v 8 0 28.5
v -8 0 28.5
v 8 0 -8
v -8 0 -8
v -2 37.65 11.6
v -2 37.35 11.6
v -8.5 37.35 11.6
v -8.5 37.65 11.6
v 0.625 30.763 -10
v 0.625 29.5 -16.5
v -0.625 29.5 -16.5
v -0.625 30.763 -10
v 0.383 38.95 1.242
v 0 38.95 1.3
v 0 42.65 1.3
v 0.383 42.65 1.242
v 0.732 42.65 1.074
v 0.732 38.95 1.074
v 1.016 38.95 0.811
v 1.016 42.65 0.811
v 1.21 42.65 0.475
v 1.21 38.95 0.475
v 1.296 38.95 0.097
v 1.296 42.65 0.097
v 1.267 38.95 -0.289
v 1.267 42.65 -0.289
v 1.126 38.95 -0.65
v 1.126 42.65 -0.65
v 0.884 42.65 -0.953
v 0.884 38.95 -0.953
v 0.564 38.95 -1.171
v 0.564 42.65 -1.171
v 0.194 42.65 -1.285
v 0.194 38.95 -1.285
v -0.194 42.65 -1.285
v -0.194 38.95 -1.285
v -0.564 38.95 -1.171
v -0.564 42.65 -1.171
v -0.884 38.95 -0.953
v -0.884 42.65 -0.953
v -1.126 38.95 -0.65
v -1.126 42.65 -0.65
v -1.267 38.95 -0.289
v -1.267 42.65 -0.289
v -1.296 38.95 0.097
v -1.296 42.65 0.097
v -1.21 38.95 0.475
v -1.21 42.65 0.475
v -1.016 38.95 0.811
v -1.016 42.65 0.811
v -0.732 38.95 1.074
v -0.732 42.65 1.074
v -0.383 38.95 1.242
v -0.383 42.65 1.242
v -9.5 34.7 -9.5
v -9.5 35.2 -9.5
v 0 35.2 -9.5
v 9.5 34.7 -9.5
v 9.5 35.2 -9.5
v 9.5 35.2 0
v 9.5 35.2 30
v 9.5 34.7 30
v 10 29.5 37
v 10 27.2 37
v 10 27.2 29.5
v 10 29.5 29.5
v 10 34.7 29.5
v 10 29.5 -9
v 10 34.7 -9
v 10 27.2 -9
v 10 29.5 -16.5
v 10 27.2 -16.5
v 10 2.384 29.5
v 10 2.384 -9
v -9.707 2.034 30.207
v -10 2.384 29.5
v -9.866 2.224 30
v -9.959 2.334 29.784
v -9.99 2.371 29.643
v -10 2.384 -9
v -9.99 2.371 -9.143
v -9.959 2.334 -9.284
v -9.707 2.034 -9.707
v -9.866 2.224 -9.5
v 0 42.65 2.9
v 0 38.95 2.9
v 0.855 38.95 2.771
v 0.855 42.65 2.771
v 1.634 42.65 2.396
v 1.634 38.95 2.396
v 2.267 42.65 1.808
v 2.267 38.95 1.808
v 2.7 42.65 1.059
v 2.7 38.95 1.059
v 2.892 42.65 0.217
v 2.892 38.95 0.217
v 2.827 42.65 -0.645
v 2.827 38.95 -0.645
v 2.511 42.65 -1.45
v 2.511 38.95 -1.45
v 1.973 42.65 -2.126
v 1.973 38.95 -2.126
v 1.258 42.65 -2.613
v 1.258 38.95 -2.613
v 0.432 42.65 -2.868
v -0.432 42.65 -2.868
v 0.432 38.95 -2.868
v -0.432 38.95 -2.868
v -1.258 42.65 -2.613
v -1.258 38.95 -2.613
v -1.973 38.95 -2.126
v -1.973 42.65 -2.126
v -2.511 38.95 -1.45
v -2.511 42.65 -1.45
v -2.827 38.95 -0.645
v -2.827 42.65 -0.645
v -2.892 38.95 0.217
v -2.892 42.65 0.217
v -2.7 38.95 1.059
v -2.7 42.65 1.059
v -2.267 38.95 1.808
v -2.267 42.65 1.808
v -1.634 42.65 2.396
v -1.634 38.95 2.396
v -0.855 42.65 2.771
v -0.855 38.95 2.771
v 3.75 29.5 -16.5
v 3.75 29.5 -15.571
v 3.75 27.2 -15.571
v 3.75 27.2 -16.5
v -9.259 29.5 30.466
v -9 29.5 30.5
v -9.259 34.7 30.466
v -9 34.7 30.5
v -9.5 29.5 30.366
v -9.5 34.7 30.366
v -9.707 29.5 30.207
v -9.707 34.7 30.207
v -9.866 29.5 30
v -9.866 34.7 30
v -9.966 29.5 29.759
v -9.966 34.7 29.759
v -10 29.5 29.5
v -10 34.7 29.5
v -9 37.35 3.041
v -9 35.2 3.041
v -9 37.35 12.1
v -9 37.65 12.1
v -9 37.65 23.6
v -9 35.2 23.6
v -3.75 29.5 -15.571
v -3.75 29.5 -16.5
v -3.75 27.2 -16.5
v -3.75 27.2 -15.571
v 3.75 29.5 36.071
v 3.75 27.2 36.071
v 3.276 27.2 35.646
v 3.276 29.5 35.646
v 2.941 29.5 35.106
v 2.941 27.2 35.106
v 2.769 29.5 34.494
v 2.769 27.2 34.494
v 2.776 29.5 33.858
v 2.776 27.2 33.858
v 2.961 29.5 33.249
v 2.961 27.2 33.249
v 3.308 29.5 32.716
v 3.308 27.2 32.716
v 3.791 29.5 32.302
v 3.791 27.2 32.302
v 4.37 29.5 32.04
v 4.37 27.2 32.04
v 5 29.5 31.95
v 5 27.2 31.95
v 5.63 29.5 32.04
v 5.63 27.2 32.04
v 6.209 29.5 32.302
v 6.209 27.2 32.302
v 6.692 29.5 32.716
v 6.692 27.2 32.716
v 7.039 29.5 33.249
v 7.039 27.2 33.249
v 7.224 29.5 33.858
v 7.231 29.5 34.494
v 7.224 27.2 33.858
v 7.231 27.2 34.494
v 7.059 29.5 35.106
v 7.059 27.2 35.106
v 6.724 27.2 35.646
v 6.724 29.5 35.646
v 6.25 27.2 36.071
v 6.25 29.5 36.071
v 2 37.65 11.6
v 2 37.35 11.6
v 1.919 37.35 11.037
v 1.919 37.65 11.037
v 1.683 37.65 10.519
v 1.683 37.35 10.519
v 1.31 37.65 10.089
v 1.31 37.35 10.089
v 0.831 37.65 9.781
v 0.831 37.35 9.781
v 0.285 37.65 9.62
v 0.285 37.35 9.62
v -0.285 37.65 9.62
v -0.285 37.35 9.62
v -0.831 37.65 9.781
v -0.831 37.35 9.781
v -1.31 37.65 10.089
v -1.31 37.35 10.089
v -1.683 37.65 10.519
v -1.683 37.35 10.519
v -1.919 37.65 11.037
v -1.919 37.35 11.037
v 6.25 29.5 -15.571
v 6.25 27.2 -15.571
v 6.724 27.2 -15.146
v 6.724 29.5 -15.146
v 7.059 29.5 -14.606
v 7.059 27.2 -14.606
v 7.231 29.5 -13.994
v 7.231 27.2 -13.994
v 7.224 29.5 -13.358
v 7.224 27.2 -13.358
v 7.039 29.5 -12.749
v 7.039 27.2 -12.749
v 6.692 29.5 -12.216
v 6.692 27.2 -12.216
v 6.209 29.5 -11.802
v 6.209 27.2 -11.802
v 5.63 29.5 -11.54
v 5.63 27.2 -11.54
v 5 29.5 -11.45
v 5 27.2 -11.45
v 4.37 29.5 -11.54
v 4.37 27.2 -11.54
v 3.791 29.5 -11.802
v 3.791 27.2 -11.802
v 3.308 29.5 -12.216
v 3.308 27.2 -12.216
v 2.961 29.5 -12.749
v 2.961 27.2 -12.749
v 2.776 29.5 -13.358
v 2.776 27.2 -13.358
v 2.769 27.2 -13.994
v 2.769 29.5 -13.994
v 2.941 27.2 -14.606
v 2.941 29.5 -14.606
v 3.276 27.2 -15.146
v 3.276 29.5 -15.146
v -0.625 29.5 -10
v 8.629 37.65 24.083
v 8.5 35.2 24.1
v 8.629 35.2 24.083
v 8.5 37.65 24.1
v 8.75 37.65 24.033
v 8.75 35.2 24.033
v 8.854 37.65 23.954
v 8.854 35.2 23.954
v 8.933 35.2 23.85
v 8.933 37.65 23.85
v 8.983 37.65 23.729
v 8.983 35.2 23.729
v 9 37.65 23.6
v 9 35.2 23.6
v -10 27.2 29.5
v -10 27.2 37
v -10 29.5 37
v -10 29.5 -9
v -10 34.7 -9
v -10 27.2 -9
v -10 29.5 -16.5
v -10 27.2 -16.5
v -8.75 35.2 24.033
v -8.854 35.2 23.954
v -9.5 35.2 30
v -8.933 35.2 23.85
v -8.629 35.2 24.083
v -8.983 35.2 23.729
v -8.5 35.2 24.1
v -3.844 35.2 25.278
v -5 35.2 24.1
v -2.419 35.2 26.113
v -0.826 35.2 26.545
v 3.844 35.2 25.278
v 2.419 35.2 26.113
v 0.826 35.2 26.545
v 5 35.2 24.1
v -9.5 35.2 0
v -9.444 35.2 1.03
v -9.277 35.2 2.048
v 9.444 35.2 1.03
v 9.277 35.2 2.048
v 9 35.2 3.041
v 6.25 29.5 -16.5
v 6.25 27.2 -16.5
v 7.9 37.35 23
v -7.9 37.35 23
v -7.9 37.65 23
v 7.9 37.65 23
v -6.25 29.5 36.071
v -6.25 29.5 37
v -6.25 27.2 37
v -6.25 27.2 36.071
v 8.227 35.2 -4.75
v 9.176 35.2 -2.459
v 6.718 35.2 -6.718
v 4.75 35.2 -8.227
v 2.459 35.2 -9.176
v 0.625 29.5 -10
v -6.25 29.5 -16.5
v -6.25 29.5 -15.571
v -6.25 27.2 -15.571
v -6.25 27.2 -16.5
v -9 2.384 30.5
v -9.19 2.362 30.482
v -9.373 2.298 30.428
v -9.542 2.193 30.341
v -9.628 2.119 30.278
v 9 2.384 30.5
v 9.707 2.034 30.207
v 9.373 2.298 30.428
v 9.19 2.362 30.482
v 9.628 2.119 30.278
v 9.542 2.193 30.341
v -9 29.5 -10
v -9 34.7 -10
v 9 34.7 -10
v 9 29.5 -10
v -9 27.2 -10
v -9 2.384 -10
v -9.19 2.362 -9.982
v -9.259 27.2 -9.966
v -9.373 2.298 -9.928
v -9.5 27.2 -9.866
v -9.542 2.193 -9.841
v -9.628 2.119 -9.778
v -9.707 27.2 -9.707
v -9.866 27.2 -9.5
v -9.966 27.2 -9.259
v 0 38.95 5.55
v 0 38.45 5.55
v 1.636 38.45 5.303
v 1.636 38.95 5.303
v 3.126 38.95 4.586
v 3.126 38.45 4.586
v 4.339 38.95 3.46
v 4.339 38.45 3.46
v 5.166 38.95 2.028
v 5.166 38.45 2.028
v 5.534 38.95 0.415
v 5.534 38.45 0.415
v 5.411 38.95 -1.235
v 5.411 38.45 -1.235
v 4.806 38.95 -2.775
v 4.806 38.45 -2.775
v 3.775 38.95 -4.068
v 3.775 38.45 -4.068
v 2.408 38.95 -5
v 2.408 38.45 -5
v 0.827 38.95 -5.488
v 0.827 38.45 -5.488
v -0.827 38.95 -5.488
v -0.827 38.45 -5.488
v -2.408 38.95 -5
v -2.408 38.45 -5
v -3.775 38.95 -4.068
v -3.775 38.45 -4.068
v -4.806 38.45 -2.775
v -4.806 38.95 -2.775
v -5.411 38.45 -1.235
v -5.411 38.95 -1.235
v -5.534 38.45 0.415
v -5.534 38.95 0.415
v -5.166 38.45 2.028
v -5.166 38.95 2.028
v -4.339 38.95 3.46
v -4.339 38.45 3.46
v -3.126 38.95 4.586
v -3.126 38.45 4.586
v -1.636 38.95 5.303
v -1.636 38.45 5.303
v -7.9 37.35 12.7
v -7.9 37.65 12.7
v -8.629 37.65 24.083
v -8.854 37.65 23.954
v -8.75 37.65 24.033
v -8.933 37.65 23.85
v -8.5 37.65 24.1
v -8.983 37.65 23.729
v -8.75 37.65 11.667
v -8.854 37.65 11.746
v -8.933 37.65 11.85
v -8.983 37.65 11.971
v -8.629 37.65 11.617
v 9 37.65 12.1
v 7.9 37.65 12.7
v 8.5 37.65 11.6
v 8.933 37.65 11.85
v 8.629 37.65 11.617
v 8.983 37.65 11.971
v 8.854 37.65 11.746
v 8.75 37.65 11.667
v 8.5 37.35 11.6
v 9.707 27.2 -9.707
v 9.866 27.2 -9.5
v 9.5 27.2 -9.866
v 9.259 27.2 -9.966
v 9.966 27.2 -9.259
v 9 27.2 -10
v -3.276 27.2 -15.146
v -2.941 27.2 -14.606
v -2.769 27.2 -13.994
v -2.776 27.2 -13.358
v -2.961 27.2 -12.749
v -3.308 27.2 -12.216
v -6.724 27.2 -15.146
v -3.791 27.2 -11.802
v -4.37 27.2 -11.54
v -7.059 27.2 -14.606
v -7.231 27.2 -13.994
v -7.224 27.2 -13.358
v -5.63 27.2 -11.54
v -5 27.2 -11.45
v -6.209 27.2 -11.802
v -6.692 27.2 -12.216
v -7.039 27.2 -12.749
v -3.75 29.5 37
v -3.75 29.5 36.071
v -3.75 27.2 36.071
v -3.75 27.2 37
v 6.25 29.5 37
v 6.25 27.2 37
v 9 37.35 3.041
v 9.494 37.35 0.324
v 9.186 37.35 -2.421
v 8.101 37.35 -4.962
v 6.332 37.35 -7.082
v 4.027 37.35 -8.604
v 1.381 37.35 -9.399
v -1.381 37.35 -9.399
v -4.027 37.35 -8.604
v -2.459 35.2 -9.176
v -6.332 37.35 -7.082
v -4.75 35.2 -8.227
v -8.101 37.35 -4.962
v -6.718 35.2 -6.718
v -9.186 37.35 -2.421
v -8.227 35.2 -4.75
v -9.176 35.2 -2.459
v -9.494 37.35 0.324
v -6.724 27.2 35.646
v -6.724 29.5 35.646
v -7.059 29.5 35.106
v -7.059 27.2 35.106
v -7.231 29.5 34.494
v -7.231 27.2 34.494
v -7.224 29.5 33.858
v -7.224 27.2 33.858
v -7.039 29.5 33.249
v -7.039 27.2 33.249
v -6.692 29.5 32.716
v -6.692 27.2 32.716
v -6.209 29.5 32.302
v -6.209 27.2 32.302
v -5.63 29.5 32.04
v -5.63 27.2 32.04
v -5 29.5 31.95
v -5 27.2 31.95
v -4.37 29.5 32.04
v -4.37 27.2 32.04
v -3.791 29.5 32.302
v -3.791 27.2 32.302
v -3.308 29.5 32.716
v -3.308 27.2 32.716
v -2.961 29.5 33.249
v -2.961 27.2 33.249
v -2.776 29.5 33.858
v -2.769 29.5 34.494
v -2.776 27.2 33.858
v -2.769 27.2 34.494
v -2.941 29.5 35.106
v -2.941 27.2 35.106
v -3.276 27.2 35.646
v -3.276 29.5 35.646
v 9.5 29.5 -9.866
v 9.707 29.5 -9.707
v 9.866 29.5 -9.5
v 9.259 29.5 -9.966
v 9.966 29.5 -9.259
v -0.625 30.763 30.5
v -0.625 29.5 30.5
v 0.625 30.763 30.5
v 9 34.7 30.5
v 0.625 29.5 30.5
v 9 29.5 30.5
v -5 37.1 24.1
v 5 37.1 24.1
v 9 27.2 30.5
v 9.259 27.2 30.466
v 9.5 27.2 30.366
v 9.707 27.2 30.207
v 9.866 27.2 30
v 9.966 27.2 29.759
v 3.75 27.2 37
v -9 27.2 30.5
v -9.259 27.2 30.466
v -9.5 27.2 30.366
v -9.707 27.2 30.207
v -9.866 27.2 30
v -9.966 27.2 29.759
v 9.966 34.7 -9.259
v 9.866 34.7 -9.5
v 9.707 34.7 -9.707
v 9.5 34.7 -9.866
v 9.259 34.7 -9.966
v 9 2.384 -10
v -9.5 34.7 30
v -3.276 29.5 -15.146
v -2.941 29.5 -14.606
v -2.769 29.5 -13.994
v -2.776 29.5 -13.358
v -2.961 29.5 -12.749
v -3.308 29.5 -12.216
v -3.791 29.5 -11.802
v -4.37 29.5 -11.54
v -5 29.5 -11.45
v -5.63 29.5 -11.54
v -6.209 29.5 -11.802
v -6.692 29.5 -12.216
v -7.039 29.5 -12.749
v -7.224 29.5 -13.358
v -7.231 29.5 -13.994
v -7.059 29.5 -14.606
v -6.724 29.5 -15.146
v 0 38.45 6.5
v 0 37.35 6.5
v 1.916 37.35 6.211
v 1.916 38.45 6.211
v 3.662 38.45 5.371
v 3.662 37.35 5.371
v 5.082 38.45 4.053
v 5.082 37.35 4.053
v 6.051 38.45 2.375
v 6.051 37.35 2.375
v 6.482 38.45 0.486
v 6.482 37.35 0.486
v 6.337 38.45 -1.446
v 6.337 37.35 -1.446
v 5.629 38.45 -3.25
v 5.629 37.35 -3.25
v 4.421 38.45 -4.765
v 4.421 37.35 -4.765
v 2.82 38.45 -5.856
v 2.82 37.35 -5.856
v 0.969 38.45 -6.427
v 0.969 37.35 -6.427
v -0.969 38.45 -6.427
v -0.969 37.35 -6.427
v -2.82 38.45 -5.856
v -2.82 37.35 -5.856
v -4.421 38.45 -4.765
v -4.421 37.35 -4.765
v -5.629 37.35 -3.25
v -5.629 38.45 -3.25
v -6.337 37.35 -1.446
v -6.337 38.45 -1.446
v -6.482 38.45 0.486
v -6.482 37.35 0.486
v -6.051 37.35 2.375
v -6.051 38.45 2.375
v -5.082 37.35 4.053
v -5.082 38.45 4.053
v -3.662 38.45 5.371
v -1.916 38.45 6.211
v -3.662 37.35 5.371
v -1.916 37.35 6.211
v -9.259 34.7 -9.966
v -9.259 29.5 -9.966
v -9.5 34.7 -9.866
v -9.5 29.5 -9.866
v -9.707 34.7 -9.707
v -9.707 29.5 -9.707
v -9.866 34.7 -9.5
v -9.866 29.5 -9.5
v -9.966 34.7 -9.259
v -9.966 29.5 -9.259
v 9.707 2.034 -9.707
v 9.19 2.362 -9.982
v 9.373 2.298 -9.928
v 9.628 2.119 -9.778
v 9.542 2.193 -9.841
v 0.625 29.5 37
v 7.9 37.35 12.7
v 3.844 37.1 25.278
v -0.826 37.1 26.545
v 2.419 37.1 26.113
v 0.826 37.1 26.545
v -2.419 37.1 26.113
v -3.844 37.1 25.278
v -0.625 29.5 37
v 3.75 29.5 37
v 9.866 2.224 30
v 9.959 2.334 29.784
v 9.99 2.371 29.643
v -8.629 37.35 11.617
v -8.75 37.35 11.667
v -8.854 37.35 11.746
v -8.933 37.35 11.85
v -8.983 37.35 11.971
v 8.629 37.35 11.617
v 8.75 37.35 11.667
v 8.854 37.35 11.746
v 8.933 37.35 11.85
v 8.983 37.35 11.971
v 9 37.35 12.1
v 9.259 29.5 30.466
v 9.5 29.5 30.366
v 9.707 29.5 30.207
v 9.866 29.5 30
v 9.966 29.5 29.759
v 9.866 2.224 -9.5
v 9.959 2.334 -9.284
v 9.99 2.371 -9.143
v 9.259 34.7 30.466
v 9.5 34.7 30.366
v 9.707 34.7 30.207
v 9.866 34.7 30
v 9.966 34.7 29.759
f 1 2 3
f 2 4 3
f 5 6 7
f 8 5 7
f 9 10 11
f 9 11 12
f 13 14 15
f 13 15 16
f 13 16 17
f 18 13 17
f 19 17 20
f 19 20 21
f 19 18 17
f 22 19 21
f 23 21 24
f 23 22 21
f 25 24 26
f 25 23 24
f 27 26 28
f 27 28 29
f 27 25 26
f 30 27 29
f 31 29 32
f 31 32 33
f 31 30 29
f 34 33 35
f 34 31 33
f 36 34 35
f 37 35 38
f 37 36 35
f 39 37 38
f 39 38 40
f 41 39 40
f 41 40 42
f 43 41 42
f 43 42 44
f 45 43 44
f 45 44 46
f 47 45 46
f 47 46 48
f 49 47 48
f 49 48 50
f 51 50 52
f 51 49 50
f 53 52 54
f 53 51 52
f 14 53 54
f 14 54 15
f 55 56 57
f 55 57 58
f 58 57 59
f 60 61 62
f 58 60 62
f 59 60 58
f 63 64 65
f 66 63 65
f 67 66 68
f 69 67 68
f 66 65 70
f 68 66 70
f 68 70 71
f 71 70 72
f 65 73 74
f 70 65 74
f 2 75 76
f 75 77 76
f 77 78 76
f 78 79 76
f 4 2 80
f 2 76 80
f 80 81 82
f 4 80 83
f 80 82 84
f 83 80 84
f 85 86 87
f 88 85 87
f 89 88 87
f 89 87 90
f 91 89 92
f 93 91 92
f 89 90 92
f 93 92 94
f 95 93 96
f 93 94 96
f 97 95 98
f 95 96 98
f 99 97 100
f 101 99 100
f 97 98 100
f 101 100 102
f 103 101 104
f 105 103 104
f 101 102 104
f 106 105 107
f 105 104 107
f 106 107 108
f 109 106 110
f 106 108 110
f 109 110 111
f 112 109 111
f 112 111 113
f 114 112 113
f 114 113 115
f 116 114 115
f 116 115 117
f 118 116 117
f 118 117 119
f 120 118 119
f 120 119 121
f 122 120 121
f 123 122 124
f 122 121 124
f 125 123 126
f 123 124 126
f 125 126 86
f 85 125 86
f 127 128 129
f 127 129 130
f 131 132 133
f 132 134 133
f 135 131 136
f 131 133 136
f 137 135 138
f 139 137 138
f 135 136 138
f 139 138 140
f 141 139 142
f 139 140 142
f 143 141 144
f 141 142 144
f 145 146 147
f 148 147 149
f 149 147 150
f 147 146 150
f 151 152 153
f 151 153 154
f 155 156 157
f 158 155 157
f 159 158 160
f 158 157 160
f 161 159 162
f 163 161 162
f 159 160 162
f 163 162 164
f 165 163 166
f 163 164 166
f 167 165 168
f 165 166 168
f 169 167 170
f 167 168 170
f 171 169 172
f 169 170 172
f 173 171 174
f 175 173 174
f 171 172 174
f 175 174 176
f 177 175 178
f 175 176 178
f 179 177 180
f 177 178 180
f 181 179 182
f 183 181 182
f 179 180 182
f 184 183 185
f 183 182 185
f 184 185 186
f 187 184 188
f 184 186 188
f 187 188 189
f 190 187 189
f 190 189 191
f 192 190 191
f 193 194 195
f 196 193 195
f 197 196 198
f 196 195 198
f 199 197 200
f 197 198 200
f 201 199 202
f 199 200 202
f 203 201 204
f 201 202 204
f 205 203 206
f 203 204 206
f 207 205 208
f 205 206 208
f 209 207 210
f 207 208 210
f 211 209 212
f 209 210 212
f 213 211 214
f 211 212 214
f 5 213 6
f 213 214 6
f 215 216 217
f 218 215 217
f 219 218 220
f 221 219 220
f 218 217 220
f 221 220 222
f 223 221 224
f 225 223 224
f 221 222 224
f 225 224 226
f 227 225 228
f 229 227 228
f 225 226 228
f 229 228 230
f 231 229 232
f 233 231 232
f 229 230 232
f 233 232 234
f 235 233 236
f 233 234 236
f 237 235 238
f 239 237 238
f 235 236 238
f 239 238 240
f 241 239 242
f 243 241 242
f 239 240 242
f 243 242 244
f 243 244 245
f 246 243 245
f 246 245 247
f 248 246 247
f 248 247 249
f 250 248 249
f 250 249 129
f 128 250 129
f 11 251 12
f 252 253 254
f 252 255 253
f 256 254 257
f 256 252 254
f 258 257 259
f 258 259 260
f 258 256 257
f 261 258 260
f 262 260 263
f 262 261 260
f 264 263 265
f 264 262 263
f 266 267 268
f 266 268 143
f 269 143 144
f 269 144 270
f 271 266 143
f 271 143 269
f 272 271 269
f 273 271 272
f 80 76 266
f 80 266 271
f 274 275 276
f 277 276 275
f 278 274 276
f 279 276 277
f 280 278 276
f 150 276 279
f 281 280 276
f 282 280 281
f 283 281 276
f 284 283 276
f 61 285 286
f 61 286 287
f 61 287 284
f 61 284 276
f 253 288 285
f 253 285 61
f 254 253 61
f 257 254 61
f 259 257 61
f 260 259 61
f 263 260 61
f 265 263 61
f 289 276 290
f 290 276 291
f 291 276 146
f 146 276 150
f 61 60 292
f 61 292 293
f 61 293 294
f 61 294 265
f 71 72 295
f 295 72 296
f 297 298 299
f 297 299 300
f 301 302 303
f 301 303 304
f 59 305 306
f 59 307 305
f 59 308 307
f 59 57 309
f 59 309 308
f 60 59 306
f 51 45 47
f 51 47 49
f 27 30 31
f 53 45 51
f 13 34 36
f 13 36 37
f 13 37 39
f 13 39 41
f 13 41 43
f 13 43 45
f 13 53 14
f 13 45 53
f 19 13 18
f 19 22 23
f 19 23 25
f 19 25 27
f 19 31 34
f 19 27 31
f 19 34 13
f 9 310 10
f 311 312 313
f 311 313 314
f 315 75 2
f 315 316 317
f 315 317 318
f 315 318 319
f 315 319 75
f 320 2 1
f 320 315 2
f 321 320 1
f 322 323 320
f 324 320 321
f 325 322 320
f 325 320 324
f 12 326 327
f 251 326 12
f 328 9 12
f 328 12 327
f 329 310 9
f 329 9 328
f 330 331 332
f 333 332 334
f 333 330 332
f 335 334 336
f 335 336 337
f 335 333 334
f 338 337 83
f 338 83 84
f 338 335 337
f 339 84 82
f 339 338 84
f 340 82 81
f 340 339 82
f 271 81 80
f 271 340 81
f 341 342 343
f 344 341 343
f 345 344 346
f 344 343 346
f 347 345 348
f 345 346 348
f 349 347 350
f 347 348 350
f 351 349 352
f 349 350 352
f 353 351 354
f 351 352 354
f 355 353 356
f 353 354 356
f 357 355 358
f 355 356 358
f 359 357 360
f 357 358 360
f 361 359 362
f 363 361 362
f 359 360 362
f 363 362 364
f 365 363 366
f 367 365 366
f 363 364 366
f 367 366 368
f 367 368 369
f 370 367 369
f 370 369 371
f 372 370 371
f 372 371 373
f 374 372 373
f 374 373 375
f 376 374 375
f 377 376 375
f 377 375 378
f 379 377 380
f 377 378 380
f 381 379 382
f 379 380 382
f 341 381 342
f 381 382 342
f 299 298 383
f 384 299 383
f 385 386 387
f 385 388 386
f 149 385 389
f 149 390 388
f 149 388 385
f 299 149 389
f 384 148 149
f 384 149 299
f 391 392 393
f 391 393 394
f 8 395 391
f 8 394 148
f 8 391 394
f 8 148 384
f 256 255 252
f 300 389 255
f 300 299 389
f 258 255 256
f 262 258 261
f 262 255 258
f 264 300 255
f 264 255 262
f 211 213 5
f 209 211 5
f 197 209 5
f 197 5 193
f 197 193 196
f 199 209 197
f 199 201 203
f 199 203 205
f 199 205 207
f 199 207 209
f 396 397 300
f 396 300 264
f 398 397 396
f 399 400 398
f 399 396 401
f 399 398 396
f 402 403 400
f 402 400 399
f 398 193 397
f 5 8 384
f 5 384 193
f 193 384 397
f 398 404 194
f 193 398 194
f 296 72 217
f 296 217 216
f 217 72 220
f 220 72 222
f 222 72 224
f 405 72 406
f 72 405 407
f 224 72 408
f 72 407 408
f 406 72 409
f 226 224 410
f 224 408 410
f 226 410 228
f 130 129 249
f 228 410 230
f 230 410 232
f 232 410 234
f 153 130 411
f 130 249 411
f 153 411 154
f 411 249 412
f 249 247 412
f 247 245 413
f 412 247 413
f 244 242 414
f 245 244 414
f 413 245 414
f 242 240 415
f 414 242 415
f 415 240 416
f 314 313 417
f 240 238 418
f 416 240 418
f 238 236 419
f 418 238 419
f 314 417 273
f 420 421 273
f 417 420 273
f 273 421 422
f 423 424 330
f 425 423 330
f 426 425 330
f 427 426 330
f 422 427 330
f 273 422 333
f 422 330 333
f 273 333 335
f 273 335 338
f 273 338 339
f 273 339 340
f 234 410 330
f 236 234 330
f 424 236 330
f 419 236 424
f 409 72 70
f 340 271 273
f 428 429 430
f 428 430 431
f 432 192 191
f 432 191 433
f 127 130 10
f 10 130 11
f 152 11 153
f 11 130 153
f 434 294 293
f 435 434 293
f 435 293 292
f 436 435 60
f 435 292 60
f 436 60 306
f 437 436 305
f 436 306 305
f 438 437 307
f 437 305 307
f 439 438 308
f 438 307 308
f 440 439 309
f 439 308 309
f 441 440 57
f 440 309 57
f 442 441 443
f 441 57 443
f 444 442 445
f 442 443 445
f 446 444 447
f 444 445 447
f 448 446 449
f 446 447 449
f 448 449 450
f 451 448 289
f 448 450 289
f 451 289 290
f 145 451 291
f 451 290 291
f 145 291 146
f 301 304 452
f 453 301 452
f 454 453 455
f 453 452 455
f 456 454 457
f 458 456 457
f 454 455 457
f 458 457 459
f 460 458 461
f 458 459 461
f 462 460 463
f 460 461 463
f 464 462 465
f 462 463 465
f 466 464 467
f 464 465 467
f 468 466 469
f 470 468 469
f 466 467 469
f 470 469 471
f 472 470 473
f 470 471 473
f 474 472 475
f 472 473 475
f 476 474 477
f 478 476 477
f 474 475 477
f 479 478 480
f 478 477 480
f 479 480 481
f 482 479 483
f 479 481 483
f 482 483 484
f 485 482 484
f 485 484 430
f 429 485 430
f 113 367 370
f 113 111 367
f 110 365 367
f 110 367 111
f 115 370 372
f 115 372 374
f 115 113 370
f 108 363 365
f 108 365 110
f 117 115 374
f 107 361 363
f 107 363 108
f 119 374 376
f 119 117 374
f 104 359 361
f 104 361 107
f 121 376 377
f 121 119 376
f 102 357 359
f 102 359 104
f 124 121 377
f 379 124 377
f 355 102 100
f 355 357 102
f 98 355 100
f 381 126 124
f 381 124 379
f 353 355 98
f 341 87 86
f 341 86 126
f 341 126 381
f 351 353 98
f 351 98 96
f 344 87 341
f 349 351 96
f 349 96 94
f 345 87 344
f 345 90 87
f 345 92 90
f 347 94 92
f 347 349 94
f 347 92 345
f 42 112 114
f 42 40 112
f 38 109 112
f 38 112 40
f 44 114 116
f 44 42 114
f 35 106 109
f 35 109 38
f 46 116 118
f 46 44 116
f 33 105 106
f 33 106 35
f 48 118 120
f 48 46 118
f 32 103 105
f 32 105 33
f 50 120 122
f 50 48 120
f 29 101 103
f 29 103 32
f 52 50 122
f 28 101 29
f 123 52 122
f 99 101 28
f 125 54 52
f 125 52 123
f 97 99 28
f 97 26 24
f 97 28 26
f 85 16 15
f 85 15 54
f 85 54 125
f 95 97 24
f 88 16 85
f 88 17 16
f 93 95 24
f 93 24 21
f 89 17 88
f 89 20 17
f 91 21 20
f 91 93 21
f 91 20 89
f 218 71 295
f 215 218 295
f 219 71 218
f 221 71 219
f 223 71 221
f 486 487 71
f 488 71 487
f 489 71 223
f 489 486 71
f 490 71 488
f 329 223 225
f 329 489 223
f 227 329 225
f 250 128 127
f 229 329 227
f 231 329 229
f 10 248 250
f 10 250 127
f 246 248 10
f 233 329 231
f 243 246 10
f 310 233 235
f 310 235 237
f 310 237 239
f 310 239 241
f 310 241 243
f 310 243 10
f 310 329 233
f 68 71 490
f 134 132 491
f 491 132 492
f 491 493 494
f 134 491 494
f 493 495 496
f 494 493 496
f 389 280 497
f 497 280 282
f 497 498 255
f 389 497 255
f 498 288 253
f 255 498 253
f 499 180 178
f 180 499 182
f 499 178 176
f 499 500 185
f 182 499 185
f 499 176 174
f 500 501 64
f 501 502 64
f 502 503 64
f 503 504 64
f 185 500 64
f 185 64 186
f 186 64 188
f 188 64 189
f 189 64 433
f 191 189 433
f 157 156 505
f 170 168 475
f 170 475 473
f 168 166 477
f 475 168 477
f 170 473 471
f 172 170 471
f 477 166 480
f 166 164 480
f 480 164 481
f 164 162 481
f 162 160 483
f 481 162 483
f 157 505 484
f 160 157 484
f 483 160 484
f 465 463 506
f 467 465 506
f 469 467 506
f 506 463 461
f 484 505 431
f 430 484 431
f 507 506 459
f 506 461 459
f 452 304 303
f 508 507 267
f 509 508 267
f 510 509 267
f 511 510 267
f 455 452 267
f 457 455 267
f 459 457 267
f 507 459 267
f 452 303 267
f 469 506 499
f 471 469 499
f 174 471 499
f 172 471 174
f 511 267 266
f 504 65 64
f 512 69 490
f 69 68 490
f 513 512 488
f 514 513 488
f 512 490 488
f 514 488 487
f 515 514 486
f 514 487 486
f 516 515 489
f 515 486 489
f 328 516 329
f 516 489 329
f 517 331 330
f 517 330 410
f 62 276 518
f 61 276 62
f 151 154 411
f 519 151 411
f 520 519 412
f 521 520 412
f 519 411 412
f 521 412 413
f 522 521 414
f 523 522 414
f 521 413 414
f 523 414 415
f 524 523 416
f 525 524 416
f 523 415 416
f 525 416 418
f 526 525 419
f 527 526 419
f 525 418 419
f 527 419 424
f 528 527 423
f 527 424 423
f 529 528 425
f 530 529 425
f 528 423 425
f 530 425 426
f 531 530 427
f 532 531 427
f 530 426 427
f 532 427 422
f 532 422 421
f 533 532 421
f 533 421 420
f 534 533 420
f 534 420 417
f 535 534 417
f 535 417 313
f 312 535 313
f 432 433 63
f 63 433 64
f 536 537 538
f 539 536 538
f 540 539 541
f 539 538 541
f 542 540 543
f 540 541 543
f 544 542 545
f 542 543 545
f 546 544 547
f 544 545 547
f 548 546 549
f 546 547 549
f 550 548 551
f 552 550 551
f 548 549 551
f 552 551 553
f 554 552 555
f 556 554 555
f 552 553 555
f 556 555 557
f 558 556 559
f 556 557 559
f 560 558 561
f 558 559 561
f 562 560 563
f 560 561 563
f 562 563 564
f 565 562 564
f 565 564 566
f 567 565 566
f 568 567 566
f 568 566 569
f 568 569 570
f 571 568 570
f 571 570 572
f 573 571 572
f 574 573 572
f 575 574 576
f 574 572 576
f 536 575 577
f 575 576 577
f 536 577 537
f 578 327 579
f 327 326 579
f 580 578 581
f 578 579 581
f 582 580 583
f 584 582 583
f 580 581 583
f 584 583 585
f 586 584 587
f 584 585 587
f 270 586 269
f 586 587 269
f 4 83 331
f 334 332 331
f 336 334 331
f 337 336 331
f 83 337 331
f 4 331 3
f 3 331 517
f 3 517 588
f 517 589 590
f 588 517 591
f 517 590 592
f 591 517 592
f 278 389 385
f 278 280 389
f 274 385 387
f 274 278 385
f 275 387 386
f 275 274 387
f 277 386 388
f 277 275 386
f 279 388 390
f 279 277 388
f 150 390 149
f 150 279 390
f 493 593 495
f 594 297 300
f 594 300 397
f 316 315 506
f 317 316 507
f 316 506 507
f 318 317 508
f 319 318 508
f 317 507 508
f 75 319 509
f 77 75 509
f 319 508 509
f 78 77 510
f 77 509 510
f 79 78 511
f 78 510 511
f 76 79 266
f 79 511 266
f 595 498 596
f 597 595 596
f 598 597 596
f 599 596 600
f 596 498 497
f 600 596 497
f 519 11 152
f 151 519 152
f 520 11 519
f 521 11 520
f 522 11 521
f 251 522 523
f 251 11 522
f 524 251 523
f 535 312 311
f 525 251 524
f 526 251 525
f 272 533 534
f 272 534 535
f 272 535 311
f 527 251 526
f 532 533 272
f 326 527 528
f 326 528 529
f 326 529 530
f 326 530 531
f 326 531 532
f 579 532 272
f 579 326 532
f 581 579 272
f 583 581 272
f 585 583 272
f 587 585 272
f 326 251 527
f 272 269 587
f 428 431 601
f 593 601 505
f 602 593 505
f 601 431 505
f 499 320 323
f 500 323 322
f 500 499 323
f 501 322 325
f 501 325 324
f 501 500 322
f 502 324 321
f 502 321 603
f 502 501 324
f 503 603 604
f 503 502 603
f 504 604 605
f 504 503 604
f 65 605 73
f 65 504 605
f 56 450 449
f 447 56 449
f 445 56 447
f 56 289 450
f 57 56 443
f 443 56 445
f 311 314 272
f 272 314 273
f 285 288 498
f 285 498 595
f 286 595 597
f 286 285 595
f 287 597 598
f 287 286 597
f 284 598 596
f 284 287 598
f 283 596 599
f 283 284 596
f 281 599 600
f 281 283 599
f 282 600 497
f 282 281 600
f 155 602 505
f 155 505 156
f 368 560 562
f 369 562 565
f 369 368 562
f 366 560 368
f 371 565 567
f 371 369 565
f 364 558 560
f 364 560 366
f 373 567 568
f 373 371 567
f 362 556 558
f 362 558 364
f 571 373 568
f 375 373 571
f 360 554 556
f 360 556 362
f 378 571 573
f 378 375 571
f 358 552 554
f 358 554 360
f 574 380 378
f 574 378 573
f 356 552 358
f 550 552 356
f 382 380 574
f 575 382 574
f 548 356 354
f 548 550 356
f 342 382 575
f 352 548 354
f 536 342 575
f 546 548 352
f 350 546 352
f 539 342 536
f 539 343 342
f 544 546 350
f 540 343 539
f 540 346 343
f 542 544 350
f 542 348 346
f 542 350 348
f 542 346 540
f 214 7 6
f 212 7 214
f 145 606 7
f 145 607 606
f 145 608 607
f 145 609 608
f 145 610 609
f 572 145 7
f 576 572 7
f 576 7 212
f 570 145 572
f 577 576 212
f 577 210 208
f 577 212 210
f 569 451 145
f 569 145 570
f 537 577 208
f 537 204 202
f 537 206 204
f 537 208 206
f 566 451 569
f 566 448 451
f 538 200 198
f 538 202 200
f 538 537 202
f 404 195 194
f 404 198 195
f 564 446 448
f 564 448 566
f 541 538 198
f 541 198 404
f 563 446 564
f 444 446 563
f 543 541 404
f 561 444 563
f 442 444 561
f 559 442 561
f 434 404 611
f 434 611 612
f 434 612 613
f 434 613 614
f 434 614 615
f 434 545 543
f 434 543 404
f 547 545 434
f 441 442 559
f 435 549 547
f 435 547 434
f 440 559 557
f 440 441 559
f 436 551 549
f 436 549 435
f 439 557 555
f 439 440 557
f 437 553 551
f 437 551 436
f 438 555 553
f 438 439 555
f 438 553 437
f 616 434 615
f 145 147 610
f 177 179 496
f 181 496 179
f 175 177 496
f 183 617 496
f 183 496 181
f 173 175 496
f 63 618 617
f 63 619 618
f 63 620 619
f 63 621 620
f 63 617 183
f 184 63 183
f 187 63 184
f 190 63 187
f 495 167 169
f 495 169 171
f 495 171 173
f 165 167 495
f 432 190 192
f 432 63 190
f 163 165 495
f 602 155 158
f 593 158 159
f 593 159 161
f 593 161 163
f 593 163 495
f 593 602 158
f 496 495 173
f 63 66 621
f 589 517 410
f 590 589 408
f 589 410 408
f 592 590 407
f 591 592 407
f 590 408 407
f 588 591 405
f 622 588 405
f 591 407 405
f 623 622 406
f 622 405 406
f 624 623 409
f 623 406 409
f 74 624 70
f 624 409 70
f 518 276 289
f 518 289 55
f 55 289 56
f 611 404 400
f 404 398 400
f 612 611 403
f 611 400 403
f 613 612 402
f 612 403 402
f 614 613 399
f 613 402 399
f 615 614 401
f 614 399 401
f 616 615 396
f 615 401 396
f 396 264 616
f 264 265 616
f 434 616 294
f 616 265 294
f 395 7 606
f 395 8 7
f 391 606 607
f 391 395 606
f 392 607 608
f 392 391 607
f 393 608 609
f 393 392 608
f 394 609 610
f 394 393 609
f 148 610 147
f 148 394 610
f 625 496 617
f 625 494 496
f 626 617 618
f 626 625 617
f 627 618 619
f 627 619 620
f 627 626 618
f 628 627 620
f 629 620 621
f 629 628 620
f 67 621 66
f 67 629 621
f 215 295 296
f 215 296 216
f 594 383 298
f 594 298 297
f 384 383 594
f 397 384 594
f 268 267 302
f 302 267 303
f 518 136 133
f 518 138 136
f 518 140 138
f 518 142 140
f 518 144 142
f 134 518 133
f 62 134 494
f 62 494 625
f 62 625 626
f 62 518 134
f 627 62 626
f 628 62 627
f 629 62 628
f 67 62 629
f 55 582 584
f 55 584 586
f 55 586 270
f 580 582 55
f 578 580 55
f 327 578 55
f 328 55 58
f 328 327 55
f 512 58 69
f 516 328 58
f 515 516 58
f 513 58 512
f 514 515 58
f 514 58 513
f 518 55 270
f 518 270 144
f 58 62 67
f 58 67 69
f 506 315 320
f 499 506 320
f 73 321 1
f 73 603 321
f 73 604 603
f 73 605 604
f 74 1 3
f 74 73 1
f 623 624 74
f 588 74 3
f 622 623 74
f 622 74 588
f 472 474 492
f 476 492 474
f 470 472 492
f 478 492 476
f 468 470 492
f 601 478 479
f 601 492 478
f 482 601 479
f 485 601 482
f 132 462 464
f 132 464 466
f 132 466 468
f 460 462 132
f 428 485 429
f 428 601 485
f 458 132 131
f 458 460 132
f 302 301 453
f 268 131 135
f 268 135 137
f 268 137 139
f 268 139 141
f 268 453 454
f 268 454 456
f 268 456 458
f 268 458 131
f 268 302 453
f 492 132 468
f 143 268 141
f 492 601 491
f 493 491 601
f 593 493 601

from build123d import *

# Parameters (mm, degrees)
SKETCH1_W           = 20
SKETCH1_H           = 40.5
BOSS_EXTRUDE1_DEPTH = 35.2
CHAMFER1_SIZE       = 2
CHAMFER1_SIZE2      = 2.383507185
BOSS_EXTRUDE2_DEPTH = 2.3
SKETCH3_W           = 1.25
SKETCH3_H           = 6.5
BOSS_EXTRUDE3_DEPTH = 1.3
CHAMFER2_SIZE       = 6.687920221
CHAMFER2_SIZE_2     = 1.3
SKETCH5_OUTSIDE_W   = 35.418
SKETCH5_OUTSIDE_H   = 68.918
SKETCH5_OUTSIDE_W_2 = 19
SKETCH5_OUTSIDE_H_2 = 39.5
CUT_EXTRUDE1_DEPTH  = 0.5
BOSS_EXTRUDE4_DEPTH = 2.15
BOSS_EXTRUDE5_DEPTH = 1.9
SKETCH8_R           = 6.5
BOSS_EXTRUDE6_DEPTH = 1.1
SKETCH9_R           = 5.55
BOSS_EXTRUDE7_DEPTH = 0.5
SKETCH10_R          = 2.9
SKETCH10_R_2        = 1.3
BOSS_EXTRUDE8_DEPTH = 3.7
SKETCH11_W          = 15.8
SKETCH11_H          = 10.3
BOSS_EXTRUDE9_DEPTH = 0.3
FILLET1_R           = 0.5
FILLET2_R           = 1


with BuildPart() as part:
    # Sketch1 → Boss-Extrude1 (new body)
    with BuildSketch(Plane(origin=(0, 0, 0), x_dir=(1, 0, 0), z_dir=(0, 1, 0))):
        with Locations((0, -10.25)):
            Rectangle(SKETCH1_W, SKETCH1_H)
    extrude(amount=BOSS_EXTRUDE1_DEPTH)

    # Chamfer1
    chamfer1_edges = [part.edges().sort_by_distance(p)[0] for p in [
        (0, 0, 30.5),
        (-10, 0, 10.25),
        (0, 0, -10),
        (10, 0, 10.25),
    ]]
    chamfer1_side = [part.faces().sort_by_distance(p)[0] for p in [
        (0, 0, 10.25),
    ]]
    chamfer(chamfer1_edges, length=CHAMFER1_SIZE, length2=CHAMFER1_SIZE2, reference=chamfer1_side[0])

    # Sketch2 → Boss-Extrude2 (add)
    with BuildSketch(Plane(origin=(0, 27.2, 0), x_dir=(-1, 0, 0), z_dir=(0, 1, 0))):
        with BuildLine():
            Line((10, -10), (-10, -10))
            Line((-10, -10), (-10, -16.5))
            Line((-10, -16.5), (-6.25, -16.5))
            Line((-6.25, -16.5), (-6.25, -15.570828693))
            ThreePointArc((-6.25, -15.570828693), (-5, -11.45), (-3.75, -15.570828693))
            Line((-3.75, -15.570828693), (-3.75, -16.5))
            Line((-3.75, -16.5), (3.75, -16.5))
            Line((3.75, -16.5), (3.75, -15.570828693))
            ThreePointArc((3.75, -15.570828693), (5, -11.45), (6.25, -15.570828693))
            Line((6.25, -15.570828693), (6.25, -16.5))
            Line((6.25, -16.5), (10, -16.5))
            Line((10, -16.5), (10, -10))
        make_face()
        with BuildLine():
            Line((-6.25, 37), (-10, 37))
            Line((-10, 37), (-10, 30.5))
            Line((-10, 30.5), (10, 30.5))
            Line((10, 30.5), (10, 37))
            Line((10, 37), (6.25, 37))
            Line((6.25, 37), (6.25, 36.070828693))
            ThreePointArc((6.25, 36.070828693), (5, 31.95), (3.75, 36.070828693))
            Line((3.75, 36.070828693), (3.75, 37))
            Line((3.75, 37), (-3.75, 37))
            Line((-3.75, 37), (-3.75, 36.070828693))
            ThreePointArc((-3.75, 36.070828693), (-5, 31.95), (-6.25, 36.070828693))
            Line((-6.25, 36.070828693), (-6.25, 37))
        make_face()
    extrude(amount=BOSS_EXTRUDE2_DEPTH)

    # Sketch3 → Boss-Extrude3 (add)
    with BuildSketch(Plane(origin=(0, 29.5, 0), x_dir=(1, 0, 0), z_dir=(0, 1, 0))):
        with Locations((0, -33.75)):
            Rectangle(SKETCH3_W, SKETCH3_H)
        with Locations((0, 13.25)):
            Rectangle(SKETCH3_W, SKETCH3_H)
    extrude(amount=BOSS_EXTRUDE3_DEPTH)

    # Chamfer2
    # the kernel refuses this chamfer: 6.687920221, 1.3 mm, written as the material it takes off along each edge
    with BuildSketch(Plane(origin=(-18.001773564, 30.8, 37), x_dir=(0, 0.007343799087842576, -0.9999730339438946), z_dir=(1, 0, 0))) as chamfer2_piece_1_section:
        Polygon((CHAMFER2_SIZE * 0.999973033908, -CHAMFER2_SIZE * 0.00734379908758), (-CHAMFER2_SIZE_2 * 0.00734379908784, -CHAMFER2_SIZE_2 * 0.999973033944), (0, 0), align=None)
    chamfer2_piece_1 = extrude(amount=36.003547128, mode=Mode.PRIVATE)
    chamfer2_piece_1 = split(chamfer2_piece_1, bisect_by=Plane(origin=(0, 30.433956973, 30.5), z_dir=(0, 0, 1)), keep=Keep.TOP, mode=Mode.PRIVATE)
    add(chamfer2_piece_1, mode=Mode.SUBTRACT)
    with BuildSketch(Plane(origin=(18.001773564, 30.8, -16.5), x_dir=(0, -0.9816291836389949, -0.19079870499623547), z_dir=(-1, 0, 0))) as chamfer2_piece_2_section:
        Polygon((CHAMFER2_SIZE_2 * 0.981629183639, CHAMFER2_SIZE_2 * 0.190798704996), (-CHAMFER2_SIZE * 0.190798704989, CHAMFER2_SIZE * 0.981629183604), (0, 0), align=None)
    chamfer2_piece_2 = extrude(amount=36.003547128, mode=Mode.PRIVATE)
    chamfer2_piece_2 = split(chamfer2_piece_2, bisect_by=Plane(origin=(0, 30.433956973, -10), z_dir=(0, 0, -1)), keep=Keep.TOP, mode=Mode.PRIVATE)
    add(chamfer2_piece_2, mode=Mode.SUBTRACT)

    # Sketch5 outside → Cut-Extrude1 (cut)
    with BuildSketch(Plane(origin=(0, 35.2, 0), x_dir=(1, 0, 0), z_dir=(0, 1, 0))):
        with Locations((0, -10.25)):
            Rectangle(SKETCH5_OUTSIDE_W, SKETCH5_OUTSIDE_H)
        with Locations((0, -10.25)):
            Rectangle(SKETCH5_OUTSIDE_W_2, SKETCH5_OUTSIDE_H_2, mode=Mode.SUBTRACT)
    extrude(amount=-CUT_EXTRUDE1_DEPTH, mode=Mode.SUBTRACT)

    # Sketch6 → Boss-Extrude4 (add)
    with BuildSketch(Plane(origin=(0, 35.2, 0), x_dir=(1, 0, 0), z_dir=(0, 1, 0))):
        with BuildLine():
            Line((-9, -3.041381265), (-9, -24.1))
            Line((-9, -24.1), (9, -24.1))
            Line((9, -24.1), (9, -3.041381265))
            ThreePointArc((9, -3.041381265), (0, 9.5), (-9, -3.041381265))
        make_face()
    extrude(amount=BOSS_EXTRUDE4_DEPTH)

    # Sketch7 → Boss-Extrude5 (add)
    with BuildSketch(Plane(origin=(0, 35.2, 0), x_dir=(1, 0, 0), z_dir=(0, 1, 0))):
        with BuildLine():
            Line((-5, -24.1), (5, -24.1))
            ThreePointArc((5, -24.1), (0, -26.6), (-5, -24.1))
        make_face()
    extrude(amount=BOSS_EXTRUDE5_DEPTH)

    # Sketch8 → Boss-Extrude6 (add)
    with BuildSketch(Plane(origin=(0, 37.35, 0), x_dir=(1, 0, 0), z_dir=(0, 1, 0))):
        with Locations(Location((0, 0, 0), (0, 0, 270))):
            Circle(SKETCH8_R)
    extrude(amount=BOSS_EXTRUDE6_DEPTH)

    # Sketch9 → Boss-Extrude7 (add)
    with BuildSketch(Plane(origin=(0, 38.45, 0), x_dir=(1, 0, 0), z_dir=(0, 1, 0))):
        with Locations(Location((0, 0, 0), (0, 0, 270))):
            Circle(SKETCH9_R)
    extrude(amount=BOSS_EXTRUDE7_DEPTH)

    # Sketch10 → Boss-Extrude8 (add)
    with BuildSketch(Plane(origin=(0, 38.95, 0), x_dir=(1, 0, 0), z_dir=(0, 1, 0))):
        with Locations(Location((0, 0, 0), (0, 0, 270))):
            Circle(SKETCH10_R)
        with Locations(Location((0, 0, 0), (0, 0, 270))):
            Circle(SKETCH10_R_2, mode=Mode.SUBTRACT)
    extrude(amount=BOSS_EXTRUDE8_DEPTH)

    # Sketch11 → Boss-Extrude9 (add)
    with BuildSketch(Plane(origin=(0, 37.35, 0), x_dir=(1, 0, 0), z_dir=(0, 1, 0))):
        with BuildLine():
            Line((-9, -24.1), (9, -24.1))
            Line((9, -24.1), (9, -11.6))
            Line((9, -11.6), (2, -11.6))
            ThreePointArc((2, -11.6), (0, -9.6), (-2, -11.6))
            Line((-2, -11.6), (-9, -11.6))
            Line((-9, -11.6), (-9, -24.1))
        make_face()
        with Locations((0, -17.85)):
            Rectangle(SKETCH11_W, SKETCH11_H, mode=Mode.SUBTRACT)
    extrude(amount=BOSS_EXTRUDE9_DEPTH)

    # Fillet1
    fillet1_edges = [part.edges().sort_by_distance(p)[0] for p in [
        (-9, 36.425, 24.1),
        (9, 36.425, 24.1),
        (-9, 37.5, 11.6),
        (9, 37.5, 11.6),
    ]]
    fillet(fillet1_edges, radius=FILLET1_R)

    # Fillet2
    fillet2_edges = [part.edges().sort_by_distance(p)[0] for p in [
        (10, 14.791753593, -10),
        (10, 32.1, -10),
        (10, 32.1, 30.5),
        (10, 14.791753593, 30.5),
        (-10, 32.1, 30.5),
        (-10, 14.791753593, 30.5),
        (-10, 14.791753593, -10),
        (-10, 32.1, -10),
    ]]
    fillet(fillet2_edges, radius=FILLET2_R)


solid = part.part
